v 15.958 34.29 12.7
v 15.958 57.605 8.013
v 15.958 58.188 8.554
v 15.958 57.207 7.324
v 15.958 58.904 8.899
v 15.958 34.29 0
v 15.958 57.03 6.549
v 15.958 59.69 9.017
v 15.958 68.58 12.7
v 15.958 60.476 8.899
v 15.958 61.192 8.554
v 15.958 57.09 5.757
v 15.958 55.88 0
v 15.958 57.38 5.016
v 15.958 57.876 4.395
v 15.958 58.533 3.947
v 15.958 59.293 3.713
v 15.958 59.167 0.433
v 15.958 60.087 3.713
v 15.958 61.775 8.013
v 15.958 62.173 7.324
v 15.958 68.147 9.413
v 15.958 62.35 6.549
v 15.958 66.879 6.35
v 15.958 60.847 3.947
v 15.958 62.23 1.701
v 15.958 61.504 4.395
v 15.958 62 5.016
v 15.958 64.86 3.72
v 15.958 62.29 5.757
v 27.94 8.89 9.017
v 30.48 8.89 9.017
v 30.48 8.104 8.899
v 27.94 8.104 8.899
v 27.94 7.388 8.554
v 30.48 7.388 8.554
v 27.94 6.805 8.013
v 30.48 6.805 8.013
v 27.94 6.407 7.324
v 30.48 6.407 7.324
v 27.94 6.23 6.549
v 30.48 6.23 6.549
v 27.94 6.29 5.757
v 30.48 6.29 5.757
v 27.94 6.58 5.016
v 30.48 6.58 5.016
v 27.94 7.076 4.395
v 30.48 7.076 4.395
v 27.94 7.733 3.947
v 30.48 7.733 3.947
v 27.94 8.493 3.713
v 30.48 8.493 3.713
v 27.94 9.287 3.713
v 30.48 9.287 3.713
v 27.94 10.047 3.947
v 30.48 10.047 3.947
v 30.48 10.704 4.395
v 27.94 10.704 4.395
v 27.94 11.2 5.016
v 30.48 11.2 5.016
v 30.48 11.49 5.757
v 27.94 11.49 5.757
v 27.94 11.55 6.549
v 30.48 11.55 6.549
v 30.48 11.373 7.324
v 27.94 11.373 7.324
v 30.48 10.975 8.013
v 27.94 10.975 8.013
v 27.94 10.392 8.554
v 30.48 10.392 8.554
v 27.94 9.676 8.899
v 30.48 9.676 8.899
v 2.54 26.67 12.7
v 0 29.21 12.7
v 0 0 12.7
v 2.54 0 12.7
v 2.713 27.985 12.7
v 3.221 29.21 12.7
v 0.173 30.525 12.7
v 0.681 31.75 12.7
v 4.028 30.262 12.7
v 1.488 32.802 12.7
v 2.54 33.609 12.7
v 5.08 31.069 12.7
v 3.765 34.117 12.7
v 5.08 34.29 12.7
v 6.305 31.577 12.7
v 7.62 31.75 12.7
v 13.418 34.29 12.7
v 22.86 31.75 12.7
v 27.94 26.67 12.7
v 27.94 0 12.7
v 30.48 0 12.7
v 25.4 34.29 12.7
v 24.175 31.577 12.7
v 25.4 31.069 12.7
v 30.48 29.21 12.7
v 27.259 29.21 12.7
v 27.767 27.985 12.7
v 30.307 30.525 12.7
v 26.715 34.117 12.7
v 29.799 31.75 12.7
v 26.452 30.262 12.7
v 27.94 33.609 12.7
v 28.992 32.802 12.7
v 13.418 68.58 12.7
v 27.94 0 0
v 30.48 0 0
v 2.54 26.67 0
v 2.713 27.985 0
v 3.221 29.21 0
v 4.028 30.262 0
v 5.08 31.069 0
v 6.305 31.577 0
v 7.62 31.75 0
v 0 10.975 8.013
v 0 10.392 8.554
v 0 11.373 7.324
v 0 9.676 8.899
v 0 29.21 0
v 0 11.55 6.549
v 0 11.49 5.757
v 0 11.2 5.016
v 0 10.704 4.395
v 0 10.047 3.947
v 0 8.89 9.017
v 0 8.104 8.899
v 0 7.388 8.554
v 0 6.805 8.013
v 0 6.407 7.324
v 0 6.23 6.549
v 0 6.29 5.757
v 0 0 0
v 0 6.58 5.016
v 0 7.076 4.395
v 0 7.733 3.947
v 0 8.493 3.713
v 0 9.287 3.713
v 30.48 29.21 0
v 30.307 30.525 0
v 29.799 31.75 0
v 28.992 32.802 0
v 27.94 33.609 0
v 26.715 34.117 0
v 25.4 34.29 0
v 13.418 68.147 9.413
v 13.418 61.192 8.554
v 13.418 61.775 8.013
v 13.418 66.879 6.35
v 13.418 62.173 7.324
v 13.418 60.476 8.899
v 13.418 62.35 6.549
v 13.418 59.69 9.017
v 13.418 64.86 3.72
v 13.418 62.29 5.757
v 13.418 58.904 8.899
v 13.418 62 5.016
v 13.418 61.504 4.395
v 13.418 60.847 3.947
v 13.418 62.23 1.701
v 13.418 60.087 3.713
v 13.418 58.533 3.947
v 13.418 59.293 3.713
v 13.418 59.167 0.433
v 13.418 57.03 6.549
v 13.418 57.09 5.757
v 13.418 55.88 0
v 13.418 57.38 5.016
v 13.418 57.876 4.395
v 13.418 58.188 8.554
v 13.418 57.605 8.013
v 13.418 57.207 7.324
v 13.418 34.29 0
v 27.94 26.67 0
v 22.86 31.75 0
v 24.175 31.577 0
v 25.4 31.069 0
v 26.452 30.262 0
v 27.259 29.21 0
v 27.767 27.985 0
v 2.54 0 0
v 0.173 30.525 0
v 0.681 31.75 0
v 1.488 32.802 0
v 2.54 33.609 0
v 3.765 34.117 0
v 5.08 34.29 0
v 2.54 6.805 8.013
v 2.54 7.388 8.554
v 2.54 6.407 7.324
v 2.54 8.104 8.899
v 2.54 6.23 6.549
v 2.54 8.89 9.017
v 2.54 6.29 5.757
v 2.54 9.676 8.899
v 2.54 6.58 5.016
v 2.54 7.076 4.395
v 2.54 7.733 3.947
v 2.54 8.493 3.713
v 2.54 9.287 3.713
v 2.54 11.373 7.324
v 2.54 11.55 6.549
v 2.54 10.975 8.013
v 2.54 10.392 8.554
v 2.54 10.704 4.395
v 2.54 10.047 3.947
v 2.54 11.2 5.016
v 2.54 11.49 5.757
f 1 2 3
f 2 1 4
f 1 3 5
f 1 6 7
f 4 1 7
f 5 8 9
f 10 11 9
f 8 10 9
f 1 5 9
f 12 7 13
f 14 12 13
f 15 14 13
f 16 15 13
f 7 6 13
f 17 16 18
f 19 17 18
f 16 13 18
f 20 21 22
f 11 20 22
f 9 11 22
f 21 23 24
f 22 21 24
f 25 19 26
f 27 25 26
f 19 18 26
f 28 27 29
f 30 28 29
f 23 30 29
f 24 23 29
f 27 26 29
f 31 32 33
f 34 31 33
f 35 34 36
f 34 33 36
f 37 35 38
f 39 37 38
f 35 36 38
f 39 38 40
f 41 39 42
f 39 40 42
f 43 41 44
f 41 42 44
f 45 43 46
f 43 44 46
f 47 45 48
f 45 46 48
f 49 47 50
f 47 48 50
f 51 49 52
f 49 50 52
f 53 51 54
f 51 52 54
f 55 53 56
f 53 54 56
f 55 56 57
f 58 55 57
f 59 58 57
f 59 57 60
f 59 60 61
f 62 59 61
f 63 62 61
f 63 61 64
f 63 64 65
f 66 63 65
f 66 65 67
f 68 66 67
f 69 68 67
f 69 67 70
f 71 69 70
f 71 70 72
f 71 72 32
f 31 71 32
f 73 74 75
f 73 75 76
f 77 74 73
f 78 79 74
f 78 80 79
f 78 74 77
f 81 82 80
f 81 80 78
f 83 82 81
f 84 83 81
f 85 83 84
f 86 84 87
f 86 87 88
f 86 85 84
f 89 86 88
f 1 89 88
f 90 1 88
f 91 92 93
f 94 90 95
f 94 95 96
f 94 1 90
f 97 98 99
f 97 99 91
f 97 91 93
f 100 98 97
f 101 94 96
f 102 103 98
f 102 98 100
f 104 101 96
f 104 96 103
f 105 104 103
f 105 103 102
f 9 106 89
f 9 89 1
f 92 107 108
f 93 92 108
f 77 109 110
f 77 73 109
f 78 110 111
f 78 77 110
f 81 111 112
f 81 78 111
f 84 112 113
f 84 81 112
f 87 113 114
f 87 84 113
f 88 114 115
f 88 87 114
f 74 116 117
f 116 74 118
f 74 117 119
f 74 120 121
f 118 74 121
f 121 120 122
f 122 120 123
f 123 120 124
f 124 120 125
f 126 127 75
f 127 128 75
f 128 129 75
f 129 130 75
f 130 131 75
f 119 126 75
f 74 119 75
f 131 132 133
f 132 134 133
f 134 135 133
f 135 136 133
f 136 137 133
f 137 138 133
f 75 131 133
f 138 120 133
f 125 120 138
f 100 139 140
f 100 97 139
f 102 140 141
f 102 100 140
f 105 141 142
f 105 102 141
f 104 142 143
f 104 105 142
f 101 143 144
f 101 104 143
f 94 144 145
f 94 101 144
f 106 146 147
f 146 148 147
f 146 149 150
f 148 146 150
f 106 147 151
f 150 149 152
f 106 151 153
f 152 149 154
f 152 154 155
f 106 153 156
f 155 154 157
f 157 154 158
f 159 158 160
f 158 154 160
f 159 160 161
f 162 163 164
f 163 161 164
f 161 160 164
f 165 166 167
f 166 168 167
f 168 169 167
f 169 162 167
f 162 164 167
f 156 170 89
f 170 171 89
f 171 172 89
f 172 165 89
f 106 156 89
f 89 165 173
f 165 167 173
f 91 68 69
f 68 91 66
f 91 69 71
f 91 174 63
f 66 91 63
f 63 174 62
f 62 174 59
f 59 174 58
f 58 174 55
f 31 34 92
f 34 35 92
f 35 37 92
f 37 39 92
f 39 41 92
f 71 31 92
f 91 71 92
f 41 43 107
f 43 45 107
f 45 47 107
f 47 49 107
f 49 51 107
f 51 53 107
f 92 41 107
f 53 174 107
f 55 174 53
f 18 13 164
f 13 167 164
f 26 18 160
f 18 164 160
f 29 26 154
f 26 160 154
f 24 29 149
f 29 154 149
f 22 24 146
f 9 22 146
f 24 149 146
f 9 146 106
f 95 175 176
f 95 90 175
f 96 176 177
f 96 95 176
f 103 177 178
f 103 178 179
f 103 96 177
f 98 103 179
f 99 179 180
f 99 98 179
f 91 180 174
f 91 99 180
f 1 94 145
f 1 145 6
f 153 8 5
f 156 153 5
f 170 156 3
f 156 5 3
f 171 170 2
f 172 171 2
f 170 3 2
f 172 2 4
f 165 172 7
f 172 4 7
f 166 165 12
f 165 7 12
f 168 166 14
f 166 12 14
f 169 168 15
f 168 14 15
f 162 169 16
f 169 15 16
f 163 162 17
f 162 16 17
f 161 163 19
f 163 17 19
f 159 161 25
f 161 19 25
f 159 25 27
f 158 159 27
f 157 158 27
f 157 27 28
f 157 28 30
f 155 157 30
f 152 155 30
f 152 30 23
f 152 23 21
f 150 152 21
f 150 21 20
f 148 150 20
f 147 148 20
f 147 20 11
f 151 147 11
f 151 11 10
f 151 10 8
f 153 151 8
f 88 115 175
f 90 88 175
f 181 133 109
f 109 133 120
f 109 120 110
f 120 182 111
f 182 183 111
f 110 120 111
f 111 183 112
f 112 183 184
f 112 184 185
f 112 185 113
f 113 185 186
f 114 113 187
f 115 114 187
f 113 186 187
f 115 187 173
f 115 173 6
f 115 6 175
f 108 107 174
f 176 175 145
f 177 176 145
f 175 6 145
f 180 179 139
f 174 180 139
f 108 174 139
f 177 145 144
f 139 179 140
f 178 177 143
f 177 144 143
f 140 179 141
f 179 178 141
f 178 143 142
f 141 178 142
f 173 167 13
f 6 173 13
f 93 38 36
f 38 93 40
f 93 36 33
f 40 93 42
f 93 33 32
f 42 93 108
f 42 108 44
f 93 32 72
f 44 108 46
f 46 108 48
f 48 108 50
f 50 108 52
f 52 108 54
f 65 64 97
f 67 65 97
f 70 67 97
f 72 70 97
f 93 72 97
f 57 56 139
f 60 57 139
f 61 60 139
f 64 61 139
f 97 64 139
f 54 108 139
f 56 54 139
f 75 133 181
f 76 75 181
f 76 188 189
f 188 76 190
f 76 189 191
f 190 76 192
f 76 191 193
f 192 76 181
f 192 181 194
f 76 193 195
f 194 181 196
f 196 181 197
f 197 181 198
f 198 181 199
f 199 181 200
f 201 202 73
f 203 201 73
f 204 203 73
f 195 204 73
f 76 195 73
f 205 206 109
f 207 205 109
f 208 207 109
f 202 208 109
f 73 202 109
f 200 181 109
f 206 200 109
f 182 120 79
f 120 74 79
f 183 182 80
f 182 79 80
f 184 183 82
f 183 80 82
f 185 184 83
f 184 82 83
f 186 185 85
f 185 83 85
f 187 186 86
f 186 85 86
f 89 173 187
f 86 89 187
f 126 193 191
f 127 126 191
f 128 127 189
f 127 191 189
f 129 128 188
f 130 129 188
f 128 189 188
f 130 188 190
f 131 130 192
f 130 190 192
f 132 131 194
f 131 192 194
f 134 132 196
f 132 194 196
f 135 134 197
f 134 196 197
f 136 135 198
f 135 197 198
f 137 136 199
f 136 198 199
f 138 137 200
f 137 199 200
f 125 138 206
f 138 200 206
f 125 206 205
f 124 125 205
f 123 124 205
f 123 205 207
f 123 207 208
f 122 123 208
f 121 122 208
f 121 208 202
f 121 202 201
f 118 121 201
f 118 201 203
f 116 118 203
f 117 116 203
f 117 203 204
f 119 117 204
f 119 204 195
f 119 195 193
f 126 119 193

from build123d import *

# Parameters (mm, degrees)
BOSS_EXTRUDE1_DEPTH      = 12.7
F_0000_CLEARANCE_HOLE1_D = 5.334
FILLET1_R                = 5.08
FILLET2_R                = 12.7


with BuildPart() as part:
    # Sketch1 → Boss-Extrude1 (new body)
    with BuildSketch(Plane.XY):
        Polygon((0, 0), (2.54, 0), (2.54, 31.75), (27.94, 31.75), (27.94, 0), (30.48, 0), (30.48, 34.29), (15.957826087, 34.29), (15.957826087, 68.58), (13.417826087, 68.58), (13.417826087, 34.29), (0, 34.29), align=None)
    extrude(amount=BOSS_EXTRUDE1_DEPTH)

    # #0000 Clearance Hole1 (through all)
    with Locations(Plane(origin=(0, 0, 0), x_dir=(0, 0, -1), z_dir=(-1, 0, 0))):
        with Locations((-6.35, -59.69), (-6.35, -8.89)):
            Hole(F_0000_CLEARANCE_HOLE1_D / 2)

    # Fillet1
    fillet1_edges = [part.edges().sort_by_distance(p)[0] for p in [
        (0, 34.29, 6.35),
        (30.48, 34.29, 6.35),
        (27.94, 31.75, 6.35),
        (2.54, 31.75, 6.35),
    ]]
    fillet(fillet1_edges, radius=FILLET1_R)

    # Fillet2
    fillet2_edges = [part.edges().sort_by_distance(p)[0] for p in [
        (14.687826087, 68.58, 0),
    ]]
    fillet(fillet2_edges, radius=FILLET2_R - 0.0001)  # a hair under: the kernel refuses the full size


solid = part.part
